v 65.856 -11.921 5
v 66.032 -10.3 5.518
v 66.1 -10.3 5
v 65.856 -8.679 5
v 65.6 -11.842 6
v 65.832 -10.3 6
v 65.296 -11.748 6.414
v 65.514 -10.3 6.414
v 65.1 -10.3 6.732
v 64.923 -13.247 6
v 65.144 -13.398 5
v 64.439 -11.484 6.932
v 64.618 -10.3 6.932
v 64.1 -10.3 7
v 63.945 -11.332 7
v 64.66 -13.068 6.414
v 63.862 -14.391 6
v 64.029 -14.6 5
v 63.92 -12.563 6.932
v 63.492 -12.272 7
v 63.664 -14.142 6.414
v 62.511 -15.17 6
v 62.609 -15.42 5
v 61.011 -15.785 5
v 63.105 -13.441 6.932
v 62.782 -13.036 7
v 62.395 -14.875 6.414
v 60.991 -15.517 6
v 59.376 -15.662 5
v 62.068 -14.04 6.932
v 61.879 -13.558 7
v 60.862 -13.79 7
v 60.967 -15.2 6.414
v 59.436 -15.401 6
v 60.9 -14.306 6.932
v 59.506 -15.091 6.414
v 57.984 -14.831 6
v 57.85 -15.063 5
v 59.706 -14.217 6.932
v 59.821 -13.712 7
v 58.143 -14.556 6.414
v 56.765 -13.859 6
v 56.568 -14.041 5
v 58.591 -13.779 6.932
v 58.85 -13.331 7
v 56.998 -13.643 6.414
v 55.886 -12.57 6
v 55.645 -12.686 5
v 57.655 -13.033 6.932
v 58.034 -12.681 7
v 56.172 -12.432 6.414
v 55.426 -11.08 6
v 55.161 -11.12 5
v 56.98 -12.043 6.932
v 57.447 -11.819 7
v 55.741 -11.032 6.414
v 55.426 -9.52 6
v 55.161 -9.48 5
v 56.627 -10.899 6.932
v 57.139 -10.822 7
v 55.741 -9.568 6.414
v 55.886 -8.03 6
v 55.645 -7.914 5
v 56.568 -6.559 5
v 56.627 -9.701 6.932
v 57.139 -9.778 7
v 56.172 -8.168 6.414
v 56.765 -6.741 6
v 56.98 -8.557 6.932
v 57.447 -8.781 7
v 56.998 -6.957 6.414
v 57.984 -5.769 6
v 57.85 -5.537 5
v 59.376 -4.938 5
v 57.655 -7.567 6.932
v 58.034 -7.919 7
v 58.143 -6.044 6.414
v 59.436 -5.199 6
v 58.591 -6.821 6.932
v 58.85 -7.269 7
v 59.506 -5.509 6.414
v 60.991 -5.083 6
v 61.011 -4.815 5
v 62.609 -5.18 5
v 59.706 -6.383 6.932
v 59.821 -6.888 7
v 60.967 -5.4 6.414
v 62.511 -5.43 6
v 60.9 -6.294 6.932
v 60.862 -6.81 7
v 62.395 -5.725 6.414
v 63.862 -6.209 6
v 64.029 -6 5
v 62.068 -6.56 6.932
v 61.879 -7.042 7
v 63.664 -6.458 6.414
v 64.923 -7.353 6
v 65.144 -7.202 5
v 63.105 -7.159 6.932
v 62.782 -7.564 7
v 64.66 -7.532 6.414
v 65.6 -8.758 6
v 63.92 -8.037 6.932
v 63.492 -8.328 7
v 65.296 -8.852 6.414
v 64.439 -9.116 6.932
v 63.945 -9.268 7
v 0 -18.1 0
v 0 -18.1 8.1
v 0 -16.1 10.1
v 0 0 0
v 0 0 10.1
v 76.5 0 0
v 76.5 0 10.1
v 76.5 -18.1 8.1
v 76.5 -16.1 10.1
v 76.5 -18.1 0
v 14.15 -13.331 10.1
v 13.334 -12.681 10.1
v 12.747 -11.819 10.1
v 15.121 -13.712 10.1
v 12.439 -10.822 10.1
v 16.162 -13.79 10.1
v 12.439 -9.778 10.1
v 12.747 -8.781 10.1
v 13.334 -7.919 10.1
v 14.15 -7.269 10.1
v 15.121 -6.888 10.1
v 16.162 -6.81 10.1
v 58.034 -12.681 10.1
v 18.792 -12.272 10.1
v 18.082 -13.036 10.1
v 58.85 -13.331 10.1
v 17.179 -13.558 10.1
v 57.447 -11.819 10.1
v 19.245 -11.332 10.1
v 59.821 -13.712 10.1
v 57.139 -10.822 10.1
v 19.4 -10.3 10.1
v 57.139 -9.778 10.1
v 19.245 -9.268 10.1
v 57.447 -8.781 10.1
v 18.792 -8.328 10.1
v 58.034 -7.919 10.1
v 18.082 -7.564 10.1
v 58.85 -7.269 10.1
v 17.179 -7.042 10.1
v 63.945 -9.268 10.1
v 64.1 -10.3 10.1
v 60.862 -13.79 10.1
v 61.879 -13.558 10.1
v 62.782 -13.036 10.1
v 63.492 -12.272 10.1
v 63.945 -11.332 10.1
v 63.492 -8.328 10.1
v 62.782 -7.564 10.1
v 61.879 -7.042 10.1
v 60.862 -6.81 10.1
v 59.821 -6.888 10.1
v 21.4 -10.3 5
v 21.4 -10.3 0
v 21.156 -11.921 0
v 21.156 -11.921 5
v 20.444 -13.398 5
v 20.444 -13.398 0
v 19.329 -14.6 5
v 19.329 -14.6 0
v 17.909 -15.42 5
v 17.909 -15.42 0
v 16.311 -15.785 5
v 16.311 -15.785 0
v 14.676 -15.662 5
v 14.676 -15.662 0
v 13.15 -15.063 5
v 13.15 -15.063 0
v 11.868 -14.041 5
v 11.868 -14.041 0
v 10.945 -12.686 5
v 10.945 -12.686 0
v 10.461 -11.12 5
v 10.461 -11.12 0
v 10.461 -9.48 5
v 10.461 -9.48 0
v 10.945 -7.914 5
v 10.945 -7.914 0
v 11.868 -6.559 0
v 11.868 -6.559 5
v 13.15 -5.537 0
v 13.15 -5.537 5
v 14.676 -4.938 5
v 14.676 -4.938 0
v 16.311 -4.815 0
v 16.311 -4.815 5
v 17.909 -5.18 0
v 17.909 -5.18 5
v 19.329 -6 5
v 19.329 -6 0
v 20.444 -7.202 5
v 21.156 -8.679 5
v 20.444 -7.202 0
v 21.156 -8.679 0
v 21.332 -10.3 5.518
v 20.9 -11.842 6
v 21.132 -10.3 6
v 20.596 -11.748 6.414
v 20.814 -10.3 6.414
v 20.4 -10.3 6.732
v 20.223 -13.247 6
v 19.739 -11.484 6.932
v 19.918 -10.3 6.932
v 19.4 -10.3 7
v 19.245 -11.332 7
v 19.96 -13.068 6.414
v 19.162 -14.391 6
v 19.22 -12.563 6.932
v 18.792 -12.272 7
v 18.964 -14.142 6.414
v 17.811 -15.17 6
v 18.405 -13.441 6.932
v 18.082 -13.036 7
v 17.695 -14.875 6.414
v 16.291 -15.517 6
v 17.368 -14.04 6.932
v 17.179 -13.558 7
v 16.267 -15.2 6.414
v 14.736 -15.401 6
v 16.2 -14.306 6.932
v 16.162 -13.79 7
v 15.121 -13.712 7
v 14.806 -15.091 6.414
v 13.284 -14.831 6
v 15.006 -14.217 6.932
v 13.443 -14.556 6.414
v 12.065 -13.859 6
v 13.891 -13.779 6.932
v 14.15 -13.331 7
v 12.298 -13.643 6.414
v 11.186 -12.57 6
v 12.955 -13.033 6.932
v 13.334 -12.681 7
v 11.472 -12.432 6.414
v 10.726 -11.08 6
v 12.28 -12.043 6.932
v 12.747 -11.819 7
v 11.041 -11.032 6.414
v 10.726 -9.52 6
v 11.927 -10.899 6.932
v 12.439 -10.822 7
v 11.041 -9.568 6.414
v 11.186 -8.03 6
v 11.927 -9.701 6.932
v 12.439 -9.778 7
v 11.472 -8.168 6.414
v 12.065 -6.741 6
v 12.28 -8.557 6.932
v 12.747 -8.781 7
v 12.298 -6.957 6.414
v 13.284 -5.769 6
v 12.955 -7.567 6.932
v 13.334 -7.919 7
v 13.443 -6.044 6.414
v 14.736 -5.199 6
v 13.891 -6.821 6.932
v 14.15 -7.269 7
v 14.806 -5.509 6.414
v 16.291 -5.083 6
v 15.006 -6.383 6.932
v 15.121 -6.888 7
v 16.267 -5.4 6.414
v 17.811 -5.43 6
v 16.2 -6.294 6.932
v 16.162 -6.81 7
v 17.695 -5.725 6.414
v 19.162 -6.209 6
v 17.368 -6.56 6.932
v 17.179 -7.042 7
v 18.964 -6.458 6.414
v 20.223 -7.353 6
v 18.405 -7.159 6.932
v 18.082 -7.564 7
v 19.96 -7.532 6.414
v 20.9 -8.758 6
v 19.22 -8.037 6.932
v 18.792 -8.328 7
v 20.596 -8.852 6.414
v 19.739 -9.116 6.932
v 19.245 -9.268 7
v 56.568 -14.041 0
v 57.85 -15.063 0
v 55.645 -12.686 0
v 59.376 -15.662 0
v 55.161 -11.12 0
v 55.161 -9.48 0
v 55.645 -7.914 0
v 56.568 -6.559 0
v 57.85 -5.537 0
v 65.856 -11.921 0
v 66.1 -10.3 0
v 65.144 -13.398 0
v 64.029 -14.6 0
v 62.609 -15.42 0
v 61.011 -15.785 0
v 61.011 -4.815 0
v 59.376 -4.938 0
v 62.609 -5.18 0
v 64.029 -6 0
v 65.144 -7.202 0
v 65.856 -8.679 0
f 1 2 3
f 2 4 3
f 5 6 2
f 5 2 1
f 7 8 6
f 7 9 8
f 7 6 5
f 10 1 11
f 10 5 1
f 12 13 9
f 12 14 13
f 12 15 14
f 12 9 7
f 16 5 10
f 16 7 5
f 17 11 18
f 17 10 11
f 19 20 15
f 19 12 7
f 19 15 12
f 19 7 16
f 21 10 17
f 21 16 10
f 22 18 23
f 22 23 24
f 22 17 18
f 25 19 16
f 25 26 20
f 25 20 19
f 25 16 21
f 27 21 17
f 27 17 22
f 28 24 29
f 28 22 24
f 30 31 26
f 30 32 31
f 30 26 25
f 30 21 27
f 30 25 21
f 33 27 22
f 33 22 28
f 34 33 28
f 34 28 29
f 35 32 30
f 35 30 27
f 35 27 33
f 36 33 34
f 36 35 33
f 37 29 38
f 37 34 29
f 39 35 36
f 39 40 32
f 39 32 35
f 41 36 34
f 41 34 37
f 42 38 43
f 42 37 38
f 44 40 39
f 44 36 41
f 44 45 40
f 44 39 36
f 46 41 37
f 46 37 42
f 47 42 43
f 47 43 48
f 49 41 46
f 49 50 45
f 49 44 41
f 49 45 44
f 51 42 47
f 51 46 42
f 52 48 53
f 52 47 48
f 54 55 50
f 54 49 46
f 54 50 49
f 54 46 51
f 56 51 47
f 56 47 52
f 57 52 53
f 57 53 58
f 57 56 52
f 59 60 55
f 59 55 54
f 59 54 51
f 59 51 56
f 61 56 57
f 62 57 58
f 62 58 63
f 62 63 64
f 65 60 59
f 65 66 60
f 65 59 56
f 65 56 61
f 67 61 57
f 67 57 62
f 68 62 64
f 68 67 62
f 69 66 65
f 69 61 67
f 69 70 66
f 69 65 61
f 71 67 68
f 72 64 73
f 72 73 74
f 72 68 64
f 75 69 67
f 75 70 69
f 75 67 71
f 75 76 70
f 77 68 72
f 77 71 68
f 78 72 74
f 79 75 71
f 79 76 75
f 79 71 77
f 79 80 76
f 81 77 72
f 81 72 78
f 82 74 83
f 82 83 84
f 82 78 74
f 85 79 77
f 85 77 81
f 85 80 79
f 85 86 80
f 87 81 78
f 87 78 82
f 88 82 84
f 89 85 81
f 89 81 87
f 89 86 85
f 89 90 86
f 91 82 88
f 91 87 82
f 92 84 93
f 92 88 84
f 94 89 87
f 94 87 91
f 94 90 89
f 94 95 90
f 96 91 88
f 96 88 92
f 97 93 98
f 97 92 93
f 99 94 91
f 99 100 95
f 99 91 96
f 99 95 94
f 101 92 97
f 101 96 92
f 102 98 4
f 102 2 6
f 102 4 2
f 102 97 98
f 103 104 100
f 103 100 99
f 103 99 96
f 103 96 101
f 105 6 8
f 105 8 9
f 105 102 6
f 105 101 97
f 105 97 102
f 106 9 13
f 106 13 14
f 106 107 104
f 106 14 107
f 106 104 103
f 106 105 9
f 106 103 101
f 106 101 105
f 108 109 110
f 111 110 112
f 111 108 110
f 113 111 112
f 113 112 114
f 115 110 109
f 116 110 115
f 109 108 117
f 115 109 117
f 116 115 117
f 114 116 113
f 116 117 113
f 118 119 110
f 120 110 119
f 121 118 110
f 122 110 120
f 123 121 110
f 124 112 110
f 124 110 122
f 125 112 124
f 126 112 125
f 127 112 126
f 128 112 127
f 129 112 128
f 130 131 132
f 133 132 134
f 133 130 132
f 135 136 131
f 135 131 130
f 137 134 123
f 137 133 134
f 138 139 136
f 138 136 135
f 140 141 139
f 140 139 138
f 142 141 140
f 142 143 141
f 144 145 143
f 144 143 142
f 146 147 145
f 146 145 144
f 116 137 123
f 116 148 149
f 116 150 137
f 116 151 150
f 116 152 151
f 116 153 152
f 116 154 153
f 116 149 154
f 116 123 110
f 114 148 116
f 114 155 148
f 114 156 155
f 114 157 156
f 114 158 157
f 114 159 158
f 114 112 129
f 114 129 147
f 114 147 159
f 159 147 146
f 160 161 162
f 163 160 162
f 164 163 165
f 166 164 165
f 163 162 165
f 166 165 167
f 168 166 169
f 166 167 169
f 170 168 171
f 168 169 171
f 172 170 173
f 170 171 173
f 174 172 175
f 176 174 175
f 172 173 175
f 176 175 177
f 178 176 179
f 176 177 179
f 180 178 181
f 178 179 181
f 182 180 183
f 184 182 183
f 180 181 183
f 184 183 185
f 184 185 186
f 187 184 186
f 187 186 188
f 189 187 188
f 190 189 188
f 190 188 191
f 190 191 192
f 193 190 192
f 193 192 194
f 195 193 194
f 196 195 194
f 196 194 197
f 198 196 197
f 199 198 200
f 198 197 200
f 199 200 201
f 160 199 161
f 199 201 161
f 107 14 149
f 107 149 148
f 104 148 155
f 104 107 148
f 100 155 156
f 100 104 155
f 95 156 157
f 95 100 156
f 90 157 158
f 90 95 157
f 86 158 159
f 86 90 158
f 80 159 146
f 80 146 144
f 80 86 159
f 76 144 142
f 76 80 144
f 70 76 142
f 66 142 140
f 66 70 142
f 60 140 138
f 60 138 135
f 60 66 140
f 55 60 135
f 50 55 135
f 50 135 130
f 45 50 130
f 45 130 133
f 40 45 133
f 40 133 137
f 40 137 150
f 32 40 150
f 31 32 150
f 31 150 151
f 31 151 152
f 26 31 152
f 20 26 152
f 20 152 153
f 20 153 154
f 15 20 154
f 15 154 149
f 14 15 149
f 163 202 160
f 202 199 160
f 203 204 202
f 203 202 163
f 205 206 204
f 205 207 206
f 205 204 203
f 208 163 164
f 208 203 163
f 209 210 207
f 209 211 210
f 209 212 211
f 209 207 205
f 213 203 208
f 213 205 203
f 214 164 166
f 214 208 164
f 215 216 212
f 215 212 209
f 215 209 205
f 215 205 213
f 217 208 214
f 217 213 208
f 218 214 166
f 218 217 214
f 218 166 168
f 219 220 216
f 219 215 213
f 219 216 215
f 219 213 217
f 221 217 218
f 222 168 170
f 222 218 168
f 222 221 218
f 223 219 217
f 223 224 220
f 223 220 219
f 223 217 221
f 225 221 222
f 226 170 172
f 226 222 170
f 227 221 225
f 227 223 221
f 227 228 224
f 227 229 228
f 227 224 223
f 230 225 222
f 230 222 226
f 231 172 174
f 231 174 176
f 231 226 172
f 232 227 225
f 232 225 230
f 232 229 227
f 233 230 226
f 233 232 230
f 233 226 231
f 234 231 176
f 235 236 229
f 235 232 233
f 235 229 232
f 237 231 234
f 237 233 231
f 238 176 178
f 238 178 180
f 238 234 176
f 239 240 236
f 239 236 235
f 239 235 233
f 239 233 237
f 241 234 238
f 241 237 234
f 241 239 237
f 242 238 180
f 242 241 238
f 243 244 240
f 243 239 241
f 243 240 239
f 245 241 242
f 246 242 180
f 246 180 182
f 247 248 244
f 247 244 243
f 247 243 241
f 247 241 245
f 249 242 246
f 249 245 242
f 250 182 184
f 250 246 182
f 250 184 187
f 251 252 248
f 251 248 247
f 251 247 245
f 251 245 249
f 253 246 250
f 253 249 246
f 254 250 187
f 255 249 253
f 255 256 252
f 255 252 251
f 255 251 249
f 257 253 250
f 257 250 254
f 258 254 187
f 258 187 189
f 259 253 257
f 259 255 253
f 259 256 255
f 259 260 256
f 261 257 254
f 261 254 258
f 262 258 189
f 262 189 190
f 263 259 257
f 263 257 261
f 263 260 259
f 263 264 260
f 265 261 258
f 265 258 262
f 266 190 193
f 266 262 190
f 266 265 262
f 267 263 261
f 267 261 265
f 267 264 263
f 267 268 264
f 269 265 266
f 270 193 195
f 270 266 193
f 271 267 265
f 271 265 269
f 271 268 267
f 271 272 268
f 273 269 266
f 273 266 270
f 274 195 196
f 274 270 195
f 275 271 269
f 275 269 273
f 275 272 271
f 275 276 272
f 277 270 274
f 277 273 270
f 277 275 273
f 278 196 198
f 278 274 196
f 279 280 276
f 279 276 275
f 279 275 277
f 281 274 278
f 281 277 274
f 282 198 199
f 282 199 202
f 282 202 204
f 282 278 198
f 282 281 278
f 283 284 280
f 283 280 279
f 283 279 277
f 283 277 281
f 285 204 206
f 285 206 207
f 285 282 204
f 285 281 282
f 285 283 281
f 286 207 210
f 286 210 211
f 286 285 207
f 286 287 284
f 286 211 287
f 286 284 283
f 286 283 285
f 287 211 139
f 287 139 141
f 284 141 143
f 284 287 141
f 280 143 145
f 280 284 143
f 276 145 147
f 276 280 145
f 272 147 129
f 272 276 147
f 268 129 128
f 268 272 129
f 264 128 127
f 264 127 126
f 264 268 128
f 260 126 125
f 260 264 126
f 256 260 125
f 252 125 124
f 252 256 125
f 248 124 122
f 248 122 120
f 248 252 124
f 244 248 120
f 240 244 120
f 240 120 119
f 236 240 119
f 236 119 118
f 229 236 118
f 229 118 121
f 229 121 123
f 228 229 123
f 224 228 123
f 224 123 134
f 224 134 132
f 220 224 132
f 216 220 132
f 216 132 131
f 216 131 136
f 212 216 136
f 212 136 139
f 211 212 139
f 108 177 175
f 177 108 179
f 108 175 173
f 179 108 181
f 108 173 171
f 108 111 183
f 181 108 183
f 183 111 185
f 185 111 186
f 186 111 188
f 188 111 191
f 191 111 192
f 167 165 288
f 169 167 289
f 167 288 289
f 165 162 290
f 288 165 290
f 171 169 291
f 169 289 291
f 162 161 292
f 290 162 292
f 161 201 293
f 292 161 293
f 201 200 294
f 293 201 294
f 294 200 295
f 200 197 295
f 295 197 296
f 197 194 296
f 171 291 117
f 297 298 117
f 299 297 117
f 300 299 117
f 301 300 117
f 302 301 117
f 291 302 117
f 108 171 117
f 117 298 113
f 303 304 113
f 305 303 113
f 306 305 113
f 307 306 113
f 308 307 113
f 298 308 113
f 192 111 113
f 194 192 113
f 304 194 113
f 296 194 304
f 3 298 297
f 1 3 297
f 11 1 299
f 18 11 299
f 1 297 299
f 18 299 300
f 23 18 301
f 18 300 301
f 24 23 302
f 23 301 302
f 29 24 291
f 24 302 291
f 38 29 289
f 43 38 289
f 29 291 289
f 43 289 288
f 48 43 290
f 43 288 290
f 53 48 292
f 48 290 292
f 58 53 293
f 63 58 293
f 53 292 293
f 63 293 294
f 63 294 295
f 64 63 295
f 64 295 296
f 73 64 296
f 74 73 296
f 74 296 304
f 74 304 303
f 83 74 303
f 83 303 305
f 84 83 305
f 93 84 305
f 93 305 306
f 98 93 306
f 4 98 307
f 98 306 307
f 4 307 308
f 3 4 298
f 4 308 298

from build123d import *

# Parameters (mm, degrees)
F0_W     = 76.5
F0_H     = 18.1
F0_R     = 3.5
F1_DEPTH = 10.1
F2_R     = 5.5
F3_DEPTH = 7
F4_R     = 1.99999
F5_SIZE  = 2


# Not quite as in the source:
# - a fillet or chamfer is up to 0.001 mm smaller than in the source, because OpenCascade refuses the exact size
# - a feature names something its author has since deleted; it is built from what else it names


with BuildPart() as f1:
    # F0 (on Top) → F1 (new body)
    with BuildSketch(Plane.XY):
        with Locations((38.25, -9.05)):
            Rectangle(F0_W, F0_H)
        with Locations((15.9, -10.3)):
            Circle(F0_R, mode=Mode.SUBTRACT)
        with Locations((60.6, -10.3)):
            Circle(F0_R, mode=Mode.SUBTRACT)
    extrude(amount=F1_DEPTH)

    # F2 (on face) → F3 (cut)
    with BuildSketch(Plane(origin=(0, 0, 0), x_dir=(1, 0, 0), z_dir=(0, 0, -1))):
        with Locations((60.6, 10.3)):
            Circle(F2_R)
        with Locations((15.9, 10.3)):
            Circle(F2_R)
    extrude(amount=-F3_DEPTH, mode=Mode.SUBTRACT)

    # F4 (radius 2 in the source; OpenCascade refuses exactly that, so slightly less here)
    f4_edges = [f1.edges().sort_by_distance(p)[0] for p in [
        (55.1, -10.3, 7),
        (10.4, -10.3, 7),
    ]]
    fillet(f4_edges, radius=F4_R)

    # F5
    f5_edges = [f1.edges().sort_by_distance(p)[0] for p in [
        (38.25, -18.1, 10.1),
    ]]
    chamfer(f5_edges, length=F5_SIZE)


solid = f1.part
